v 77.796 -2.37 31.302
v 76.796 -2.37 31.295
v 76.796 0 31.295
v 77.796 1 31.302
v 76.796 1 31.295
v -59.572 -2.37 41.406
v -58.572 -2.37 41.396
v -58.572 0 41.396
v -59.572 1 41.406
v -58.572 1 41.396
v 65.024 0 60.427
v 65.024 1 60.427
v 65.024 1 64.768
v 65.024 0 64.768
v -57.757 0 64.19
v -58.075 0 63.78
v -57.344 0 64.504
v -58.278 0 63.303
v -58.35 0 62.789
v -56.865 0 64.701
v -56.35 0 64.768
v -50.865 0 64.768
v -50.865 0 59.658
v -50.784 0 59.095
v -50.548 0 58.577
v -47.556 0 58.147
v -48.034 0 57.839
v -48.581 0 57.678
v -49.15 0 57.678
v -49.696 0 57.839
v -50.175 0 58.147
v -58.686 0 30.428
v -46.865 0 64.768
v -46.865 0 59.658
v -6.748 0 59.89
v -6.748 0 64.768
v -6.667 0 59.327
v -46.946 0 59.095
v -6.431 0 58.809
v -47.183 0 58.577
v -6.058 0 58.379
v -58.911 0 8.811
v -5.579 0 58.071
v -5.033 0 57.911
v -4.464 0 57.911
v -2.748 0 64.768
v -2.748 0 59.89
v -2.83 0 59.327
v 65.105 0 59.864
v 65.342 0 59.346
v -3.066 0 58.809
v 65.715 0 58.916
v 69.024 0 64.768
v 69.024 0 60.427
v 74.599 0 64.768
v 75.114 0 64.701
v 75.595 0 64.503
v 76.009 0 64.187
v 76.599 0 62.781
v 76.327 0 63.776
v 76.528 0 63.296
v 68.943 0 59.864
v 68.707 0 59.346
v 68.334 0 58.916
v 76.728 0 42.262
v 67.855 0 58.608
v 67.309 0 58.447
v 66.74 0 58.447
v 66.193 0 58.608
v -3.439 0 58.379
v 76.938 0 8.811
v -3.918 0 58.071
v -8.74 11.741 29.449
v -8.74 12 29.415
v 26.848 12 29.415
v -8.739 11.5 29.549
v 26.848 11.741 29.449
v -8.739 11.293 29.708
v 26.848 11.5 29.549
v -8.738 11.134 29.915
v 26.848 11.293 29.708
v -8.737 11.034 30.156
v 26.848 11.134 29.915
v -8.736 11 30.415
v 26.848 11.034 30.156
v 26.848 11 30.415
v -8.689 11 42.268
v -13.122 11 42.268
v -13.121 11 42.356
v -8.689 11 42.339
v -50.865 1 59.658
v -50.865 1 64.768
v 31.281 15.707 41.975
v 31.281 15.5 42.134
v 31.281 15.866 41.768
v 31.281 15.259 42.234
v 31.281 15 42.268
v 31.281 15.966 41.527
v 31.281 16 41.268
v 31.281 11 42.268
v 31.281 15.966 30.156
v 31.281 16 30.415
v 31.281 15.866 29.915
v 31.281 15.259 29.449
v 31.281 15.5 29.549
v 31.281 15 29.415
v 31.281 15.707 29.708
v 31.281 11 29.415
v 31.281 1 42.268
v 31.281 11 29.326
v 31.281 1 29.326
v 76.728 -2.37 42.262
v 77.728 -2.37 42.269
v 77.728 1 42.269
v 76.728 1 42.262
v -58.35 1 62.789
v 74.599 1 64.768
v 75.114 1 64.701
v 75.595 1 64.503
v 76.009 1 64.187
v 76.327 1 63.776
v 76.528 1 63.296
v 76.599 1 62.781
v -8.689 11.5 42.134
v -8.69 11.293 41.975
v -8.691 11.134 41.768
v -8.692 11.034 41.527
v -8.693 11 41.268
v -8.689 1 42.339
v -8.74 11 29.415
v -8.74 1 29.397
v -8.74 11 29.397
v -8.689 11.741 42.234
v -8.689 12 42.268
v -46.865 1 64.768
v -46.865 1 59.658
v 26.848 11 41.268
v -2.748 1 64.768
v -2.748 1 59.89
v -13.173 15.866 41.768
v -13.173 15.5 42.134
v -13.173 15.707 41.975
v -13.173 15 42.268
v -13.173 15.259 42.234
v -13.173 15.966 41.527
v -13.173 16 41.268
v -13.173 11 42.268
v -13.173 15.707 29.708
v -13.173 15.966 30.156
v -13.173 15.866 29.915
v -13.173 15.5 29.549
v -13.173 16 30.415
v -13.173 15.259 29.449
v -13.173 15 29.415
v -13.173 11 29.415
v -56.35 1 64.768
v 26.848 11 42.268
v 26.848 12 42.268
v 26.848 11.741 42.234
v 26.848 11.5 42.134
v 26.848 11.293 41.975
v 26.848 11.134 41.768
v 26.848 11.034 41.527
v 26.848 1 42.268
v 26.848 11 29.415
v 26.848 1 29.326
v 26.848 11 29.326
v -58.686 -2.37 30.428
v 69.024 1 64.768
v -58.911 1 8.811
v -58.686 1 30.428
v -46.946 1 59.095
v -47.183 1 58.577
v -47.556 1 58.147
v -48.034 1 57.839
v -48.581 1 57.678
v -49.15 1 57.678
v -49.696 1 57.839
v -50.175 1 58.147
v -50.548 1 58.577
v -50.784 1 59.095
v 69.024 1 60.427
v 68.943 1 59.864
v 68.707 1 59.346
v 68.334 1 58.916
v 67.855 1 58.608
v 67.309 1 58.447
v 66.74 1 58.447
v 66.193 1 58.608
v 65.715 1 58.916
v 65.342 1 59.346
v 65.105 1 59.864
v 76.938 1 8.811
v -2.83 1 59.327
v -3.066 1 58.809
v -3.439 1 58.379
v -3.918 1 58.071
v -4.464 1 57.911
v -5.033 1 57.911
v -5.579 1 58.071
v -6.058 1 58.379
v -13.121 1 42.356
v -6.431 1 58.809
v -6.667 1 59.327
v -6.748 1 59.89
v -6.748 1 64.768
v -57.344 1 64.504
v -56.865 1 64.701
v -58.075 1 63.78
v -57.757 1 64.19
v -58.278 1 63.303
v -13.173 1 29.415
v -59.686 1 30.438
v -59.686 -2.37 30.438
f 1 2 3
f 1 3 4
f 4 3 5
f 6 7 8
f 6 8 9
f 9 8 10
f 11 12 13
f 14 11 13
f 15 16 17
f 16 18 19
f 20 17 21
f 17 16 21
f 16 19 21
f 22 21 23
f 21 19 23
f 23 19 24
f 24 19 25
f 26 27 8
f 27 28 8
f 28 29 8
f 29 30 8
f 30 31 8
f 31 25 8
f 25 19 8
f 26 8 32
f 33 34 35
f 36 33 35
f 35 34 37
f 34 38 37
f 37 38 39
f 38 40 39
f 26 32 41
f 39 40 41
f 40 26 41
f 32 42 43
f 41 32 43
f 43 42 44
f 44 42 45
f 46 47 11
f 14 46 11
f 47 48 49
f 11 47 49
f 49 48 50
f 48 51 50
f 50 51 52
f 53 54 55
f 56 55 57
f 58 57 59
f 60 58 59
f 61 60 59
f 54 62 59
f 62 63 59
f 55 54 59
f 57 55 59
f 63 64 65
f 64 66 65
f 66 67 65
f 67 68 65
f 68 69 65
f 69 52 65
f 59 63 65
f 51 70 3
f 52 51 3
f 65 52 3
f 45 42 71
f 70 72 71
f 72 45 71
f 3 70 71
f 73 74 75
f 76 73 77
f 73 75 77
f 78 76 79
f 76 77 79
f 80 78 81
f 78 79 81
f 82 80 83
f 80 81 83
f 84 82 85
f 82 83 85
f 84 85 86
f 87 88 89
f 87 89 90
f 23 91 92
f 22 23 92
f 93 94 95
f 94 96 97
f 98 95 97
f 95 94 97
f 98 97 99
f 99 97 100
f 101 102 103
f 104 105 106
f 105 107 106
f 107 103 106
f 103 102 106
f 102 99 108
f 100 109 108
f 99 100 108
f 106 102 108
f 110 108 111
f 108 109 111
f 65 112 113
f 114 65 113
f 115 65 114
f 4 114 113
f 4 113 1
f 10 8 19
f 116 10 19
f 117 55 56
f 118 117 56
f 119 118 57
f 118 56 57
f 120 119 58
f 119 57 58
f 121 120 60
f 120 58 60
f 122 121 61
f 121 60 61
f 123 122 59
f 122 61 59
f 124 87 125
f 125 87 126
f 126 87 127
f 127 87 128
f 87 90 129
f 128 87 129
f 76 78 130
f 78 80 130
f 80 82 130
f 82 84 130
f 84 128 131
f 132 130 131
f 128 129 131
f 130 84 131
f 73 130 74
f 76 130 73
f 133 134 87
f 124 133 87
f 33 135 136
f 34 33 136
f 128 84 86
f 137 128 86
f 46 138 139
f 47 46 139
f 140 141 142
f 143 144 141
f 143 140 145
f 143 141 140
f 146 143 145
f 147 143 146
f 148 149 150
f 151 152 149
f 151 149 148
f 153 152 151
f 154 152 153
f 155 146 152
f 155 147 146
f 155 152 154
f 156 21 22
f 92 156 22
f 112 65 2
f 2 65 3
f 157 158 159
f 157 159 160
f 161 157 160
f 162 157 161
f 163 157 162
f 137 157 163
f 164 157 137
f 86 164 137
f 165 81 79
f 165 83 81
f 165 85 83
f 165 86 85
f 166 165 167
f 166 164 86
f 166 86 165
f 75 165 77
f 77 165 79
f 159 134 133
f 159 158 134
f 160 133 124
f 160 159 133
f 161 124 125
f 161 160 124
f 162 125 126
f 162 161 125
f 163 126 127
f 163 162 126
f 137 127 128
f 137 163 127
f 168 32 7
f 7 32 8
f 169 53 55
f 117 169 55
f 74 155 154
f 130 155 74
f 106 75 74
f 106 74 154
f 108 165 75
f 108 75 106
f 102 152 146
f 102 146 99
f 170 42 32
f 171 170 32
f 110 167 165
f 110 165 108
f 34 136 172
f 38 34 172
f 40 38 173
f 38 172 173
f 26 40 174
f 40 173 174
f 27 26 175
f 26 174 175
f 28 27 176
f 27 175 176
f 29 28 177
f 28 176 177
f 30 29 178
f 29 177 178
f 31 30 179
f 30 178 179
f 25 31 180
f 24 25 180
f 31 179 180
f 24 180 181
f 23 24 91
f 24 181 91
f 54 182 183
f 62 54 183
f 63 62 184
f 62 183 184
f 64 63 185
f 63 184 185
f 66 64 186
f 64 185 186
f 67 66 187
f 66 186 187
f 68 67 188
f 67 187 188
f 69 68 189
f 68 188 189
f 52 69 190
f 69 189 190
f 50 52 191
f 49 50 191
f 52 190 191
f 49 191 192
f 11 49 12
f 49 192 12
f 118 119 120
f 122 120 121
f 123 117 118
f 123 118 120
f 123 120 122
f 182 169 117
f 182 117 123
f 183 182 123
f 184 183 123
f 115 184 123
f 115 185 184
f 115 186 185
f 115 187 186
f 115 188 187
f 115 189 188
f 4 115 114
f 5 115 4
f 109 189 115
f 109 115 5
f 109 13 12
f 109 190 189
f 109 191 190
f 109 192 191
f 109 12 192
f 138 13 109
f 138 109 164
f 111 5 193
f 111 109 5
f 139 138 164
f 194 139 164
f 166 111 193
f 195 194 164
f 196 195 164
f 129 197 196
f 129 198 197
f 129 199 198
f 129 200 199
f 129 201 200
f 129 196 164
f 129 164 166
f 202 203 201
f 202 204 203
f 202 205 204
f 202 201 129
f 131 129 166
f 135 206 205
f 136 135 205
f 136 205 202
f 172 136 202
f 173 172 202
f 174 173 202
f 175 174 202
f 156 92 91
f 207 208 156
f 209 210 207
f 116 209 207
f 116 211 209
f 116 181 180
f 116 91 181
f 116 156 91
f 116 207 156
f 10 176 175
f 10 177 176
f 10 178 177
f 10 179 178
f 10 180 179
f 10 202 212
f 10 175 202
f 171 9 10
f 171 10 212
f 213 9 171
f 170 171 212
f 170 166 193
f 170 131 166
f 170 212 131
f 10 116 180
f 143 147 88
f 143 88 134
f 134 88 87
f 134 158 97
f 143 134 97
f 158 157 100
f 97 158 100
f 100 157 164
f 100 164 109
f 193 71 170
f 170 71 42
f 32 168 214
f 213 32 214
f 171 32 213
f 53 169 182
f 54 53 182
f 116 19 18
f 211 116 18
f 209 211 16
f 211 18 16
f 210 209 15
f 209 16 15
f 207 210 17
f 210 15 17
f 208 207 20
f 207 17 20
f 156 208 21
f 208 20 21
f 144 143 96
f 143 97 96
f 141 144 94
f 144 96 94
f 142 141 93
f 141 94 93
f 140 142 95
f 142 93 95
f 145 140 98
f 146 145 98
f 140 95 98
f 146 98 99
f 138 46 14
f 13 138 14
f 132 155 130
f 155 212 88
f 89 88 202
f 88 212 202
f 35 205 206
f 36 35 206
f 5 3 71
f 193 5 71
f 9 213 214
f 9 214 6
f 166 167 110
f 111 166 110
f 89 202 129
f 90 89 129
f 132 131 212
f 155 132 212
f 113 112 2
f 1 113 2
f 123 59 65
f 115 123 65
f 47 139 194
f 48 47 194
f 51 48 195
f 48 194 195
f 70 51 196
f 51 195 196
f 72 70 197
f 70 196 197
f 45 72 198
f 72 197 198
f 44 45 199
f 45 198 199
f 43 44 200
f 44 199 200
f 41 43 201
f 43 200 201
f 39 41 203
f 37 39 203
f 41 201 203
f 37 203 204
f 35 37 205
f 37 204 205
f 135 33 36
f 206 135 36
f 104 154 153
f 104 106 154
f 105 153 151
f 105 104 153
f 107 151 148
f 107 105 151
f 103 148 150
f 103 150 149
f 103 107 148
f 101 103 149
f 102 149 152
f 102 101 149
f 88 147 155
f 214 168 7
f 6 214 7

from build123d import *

# Parameters (mm, degrees)
BOSS_EXTRUDE1_DEPTH = 1
SKETCH3_W           = 4.432871168
SKETCH3_H           = 12.941954118
BOSS_EXTRUDE4_DEPTH = 10
SKETCH4_W           = 44.453613632
SKETCH4_H           = 12.853731213
BOSS_EXTRUDE6_DEPTH = 5
CUT_EXTRUDE1_DEPTH  = 5
FILLET3_R           = 1
FILLET4_R           = 1
SKETCH7_W           = 10.96861972
SKETCH7_H           = 3.370404632
BOSS_EXTRUDE7_DEPTH = 1
SKETCH9_W           = 10.967095029
SKETCH9_H           = 3.370404632
BOSS_EXTRUDE8_DEPTH = 1


with BuildPart() as part:
    # Sketch1 → Boss-Extrude1 (new body)
    with BuildSketch(Plane(origin=(0, 0, 0), x_dir=(1, 0, 0), z_dir=(0, 1, 0))):
        with BuildLine():
            Line((76.59869755, -62.780974611), (76.937608383, -8.810873689))
            Line((76.937608383, -8.810873689), (-58.911197585, -8.810873689))
            Line((-58.911197585, -8.810873689), (-58.350110804, -62.789203863))
            ThreePointArc((-58.350110804, -62.789203863), (-57.757063466, -64.189959956), (-56.350218844, -64.768415651))
            Line((-56.350218844, -64.768415651), (74.598736982, -64.768415651))
            ThreePointArc((74.598736982, -64.768415651), (76.008503289, -64.187062528), (76.59869755, -62.780974611))
        make_face()
    extrude(amount=BOSS_EXTRUDE1_DEPTH)

    # Sketch3 → Boss-Extrude4 (add)
    with BuildSketch(Plane(origin=(0, 1, 0), x_dir=(1, 0, 0), z_dir=(0, 1, 0))):
        Polygon((-13.121429489, -42.356471833), (-8.688593239, -42.338876898), (-8.739962395, -29.397024728), (-13.172798644, -29.414619663), align=None)
        with Locations((29.064379404, -35.797373817)):
            Rectangle(SKETCH3_W, SKETCH3_H)
    extrude(amount=BOSS_EXTRUDE4_DEPTH)

    # Sketch4 → Boss-Extrude6 (add)
    with BuildSketch(Plane(origin=(0, 11, 0), x_dir=(1, 0, 0), z_dir=(0, 1, 0))):
        with Locations((9.054008172, -35.841485269)):
            Rectangle(SKETCH4_W, SKETCH4_H)
    extrude(amount=BOSS_EXTRUDE6_DEPTH)

    # Sketch5 → Cut-Extrude1 (cut)
    with BuildSketch(Plane(origin=(0, 1, 0), x_dir=(1, 0, 0), z_dir=(0, 1, 0))):
        with BuildLine():
            Line((-50.865239297, -59.658136879), (-50.865239297, -64.768415651))
            Line((-50.865239297, -64.768415651), (-46.865239297, -64.768415651))
            Line((-46.865239297, -64.768415651), (-46.865239297, -59.658136879))
            ThreePointArc((-46.865239297, -59.658136879), (-48.865239297, -57.658136879), (-50.865239297, -59.658136879))
        make_face()
        with BuildLine():
            Line((-6.748499038, -59.890356529), (-6.748499038, -64.768415651))
            Line((-6.748499038, -64.768415651), (-2.748499038, -64.768415651))
            Line((-2.748499038, -64.768415651), (-2.748499038, -59.890356529))
            ThreePointArc((-2.748499038, -59.890356529), (-4.748499038, -57.890356529), (-6.748499038, -59.890356529))
        make_face()
        with BuildLine():
            Line((65.024259069, -60.427024757), (65.024259069, -64.768415651))
            Line((65.024259069, -64.768415651), (69.024259069, -64.768415651))
            Line((69.024259069, -64.768415651), (69.024259069, -60.427024757))
            ThreePointArc((69.024259069, -60.427024757), (67.024259069, -58.427024757), (65.024259069, -60.427024757))
        make_face()
    extrude(amount=-CUT_EXTRUDE1_DEPTH, mode=Mode.SUBTRACT)

    # Fillet3
    fillet3_edges = [part.edges().sort_by_distance(p)[0] for p in [
        (9.054008172, 16, 29.414619663),
        (9.054008172, 16, 42.268350876),
    ]]
    fillet(fillet3_edges, radius=FILLET3_R)

    # Fillet4
    fillet4_edges = [part.edges().sort_by_distance(p)[0] for p in [
        (9.079535323, 11, 42.268350876),
        (9.054025631, 11, 29.414619663),
    ]]
    fillet(fillet4_edges, radius=FILLET4_R)

    # Sketch7 → Boss-Extrude7 (add)
    with BuildSketch(Plane(origin=(-58.996409176, 0, 0.613248042), x_dir=(0.010394105727731903, 0, 0.9999459798239707), z_dir=(-0.9999459798239707, 0, 0.010394105727731903))):
        with Locations((35.300658133, -0.685202316)):
            Rectangle(SKETCH7_W, SKETCH7_H)
    extrude(amount=BOSS_EXTRUDE7_DEPTH)

    # Sketch9 → Boss-Extrude8 (add)
    with BuildSketch(Plane(origin=(76.989901201, 0, 0.483466051), x_dir=(0.0062794796676542385, 0, -0.9999802838731889), z_dir=(0.9999802838731889, 0, 0.0062794796676542385))):
        with Locations((-36.296126915, -0.685202316)):
            Rectangle(SKETCH9_W, SKETCH9_H)
    extrude(amount=BOSS_EXTRUDE8_DEPTH)


solid = part.part
